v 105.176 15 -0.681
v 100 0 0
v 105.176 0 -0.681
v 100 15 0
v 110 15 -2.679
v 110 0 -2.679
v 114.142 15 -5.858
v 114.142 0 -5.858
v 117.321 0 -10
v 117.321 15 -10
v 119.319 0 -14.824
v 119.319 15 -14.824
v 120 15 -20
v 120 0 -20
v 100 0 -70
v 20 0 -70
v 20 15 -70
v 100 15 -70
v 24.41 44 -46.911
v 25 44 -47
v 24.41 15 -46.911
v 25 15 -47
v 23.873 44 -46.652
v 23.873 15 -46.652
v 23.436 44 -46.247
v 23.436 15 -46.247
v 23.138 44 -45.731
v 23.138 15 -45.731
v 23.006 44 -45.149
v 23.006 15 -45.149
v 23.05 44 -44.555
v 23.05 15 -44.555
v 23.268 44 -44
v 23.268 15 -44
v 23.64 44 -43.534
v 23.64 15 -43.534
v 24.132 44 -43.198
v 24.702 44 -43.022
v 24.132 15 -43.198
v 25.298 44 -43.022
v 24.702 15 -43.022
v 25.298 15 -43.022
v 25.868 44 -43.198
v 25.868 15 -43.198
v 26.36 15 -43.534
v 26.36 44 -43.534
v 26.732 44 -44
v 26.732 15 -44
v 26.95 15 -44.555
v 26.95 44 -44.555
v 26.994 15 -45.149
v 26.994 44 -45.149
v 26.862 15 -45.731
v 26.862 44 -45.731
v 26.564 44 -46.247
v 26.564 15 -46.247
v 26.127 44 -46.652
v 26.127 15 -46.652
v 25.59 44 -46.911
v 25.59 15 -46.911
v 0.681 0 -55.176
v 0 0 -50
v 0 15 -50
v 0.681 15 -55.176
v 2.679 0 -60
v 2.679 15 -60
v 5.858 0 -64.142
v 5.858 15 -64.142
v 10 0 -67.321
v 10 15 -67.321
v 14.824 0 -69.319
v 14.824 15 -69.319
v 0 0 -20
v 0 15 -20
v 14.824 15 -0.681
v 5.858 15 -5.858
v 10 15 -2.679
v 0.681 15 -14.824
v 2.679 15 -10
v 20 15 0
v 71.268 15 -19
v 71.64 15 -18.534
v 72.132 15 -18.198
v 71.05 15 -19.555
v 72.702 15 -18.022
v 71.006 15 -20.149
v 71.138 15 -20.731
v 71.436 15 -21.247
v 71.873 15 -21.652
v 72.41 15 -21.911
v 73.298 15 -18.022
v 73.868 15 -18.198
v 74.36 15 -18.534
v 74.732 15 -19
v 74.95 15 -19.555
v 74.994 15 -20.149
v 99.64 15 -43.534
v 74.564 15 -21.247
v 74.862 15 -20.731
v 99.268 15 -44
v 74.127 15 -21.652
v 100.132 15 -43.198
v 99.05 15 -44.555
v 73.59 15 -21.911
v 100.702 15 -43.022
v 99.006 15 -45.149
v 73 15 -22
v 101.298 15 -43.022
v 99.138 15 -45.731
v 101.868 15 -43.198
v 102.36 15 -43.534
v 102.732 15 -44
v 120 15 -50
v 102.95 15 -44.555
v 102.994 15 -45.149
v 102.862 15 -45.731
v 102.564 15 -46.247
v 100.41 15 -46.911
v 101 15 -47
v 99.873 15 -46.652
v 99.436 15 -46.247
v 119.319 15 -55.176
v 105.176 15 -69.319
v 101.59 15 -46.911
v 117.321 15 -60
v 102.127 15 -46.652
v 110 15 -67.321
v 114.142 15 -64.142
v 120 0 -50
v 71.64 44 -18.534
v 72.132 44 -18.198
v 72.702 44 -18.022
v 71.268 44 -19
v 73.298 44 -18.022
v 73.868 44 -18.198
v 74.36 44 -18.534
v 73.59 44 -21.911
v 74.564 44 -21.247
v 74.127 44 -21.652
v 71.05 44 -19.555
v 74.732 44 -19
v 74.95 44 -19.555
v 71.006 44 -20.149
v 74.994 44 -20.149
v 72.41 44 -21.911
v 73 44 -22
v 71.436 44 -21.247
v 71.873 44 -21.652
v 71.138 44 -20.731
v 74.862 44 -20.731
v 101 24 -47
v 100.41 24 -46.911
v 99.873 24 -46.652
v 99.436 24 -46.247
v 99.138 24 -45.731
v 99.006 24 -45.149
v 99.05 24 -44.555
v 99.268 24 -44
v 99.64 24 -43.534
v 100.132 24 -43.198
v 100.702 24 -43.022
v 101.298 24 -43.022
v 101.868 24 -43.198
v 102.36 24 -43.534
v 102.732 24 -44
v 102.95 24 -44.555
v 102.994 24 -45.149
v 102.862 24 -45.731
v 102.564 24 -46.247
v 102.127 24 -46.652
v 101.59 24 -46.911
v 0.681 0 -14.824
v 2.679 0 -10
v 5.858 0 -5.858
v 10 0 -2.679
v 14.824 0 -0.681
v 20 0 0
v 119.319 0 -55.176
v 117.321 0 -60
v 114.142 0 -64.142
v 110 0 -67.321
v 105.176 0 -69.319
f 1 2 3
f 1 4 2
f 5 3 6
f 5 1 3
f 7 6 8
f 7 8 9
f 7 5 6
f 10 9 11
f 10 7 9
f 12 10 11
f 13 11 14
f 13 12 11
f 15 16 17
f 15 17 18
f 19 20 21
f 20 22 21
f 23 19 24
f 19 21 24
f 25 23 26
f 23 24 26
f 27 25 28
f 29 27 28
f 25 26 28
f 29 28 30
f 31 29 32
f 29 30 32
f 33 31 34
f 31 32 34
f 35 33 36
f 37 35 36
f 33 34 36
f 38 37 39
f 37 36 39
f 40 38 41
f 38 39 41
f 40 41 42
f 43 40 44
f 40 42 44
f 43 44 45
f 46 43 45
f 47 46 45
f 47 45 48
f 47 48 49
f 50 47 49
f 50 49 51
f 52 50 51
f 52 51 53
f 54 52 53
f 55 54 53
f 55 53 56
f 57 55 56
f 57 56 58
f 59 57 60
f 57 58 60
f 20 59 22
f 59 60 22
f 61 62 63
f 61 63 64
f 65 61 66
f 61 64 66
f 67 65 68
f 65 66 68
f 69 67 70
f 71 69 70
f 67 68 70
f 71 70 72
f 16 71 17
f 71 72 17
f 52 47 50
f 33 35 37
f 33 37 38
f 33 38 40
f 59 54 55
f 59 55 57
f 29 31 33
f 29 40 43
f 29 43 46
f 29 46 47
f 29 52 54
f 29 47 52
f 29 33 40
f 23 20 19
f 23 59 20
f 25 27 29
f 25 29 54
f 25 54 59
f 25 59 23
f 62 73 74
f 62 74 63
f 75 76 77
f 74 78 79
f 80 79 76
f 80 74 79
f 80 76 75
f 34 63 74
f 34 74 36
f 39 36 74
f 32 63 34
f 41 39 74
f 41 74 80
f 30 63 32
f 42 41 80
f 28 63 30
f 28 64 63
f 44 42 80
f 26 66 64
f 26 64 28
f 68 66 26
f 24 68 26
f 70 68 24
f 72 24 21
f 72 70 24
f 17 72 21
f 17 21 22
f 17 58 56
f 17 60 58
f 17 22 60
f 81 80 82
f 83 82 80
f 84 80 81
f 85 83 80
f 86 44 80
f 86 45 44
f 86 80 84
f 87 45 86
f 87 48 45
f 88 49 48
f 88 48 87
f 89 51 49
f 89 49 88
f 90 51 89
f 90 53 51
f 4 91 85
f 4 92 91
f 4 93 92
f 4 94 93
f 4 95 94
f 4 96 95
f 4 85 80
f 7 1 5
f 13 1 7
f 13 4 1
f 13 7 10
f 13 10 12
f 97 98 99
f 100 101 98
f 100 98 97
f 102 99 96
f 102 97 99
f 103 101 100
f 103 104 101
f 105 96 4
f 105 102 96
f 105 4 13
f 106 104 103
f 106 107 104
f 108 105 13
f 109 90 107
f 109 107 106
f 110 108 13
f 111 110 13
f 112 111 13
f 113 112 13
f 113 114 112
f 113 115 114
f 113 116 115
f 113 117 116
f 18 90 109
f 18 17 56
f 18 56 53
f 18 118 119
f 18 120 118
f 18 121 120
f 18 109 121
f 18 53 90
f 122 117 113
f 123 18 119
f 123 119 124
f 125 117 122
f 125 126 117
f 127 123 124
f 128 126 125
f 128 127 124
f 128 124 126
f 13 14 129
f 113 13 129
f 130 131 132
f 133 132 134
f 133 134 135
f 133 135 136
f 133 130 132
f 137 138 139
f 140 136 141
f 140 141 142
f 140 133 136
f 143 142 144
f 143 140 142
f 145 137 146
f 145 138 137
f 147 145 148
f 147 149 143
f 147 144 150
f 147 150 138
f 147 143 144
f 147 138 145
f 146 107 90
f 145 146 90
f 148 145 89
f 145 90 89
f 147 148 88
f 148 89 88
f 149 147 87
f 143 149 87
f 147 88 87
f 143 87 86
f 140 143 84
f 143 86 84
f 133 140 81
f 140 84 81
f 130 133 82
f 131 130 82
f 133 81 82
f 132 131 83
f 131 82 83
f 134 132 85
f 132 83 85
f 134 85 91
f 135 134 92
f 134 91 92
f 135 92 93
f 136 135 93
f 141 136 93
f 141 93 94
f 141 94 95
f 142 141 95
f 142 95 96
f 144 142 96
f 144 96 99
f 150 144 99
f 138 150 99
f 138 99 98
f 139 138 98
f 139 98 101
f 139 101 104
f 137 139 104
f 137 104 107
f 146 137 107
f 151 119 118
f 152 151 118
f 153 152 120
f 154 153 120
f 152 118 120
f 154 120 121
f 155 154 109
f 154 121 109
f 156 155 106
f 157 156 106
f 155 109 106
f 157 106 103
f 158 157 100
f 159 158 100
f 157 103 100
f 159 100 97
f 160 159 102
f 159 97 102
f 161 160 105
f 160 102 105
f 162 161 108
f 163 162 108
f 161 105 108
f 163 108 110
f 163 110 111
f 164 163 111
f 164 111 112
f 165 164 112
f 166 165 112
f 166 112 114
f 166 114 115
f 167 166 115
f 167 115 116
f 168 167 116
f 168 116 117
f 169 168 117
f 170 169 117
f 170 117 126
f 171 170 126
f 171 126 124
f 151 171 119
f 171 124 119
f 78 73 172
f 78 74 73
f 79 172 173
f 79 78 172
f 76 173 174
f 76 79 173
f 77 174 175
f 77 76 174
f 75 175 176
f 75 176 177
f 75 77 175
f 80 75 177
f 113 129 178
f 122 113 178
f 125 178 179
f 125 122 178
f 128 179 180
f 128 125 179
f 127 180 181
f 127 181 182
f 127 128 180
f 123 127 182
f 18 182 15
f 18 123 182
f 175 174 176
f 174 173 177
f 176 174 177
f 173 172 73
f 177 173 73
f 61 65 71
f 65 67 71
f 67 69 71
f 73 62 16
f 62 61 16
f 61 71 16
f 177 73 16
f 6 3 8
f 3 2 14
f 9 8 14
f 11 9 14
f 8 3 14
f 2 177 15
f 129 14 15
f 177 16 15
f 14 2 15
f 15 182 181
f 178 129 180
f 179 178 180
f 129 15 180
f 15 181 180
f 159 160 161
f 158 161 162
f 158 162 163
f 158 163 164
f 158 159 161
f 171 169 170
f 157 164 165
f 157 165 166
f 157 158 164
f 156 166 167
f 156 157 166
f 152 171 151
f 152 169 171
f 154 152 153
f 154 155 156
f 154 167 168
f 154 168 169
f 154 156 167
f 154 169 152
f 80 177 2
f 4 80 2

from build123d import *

# Parameters (mm, degrees)
SKETCH1_W           = 120
SKETCH1_H           = 70
BOSS_EXTRUDE1_DEPTH = 15
FILLET1_R           = 20
SKETCH2_R           = 2
BOSS_EXTRUDE3_DEPTH = 9
SKETCH6_R           = 2
BOSS_EXTRUDE4_DEPTH = 20


with BuildPart() as part:
    # Sketch1 → Boss-Extrude1 (new body)
    with BuildSketch(Plane(origin=(0, 0, 0), x_dir=(1, 0, 0), z_dir=(0, 1, 0))):
        with Locations((60, 35)):
            Rectangle(SKETCH1_W, SKETCH1_H)
    extrude(amount=BOSS_EXTRUDE1_DEPTH)

    # Fillet1
    fillet1_edges = [part.edges().sort_by_distance(p)[0] for p in [
        (0, 7.5, -70),
        (120, 7.5, -70),
        (120, 7.5, 0),
        (0, 7.5, 0),
    ]]
    fillet(fillet1_edges, radius=FILLET1_R)

    # Sketch2 → Boss-Extrude3 (add)
    with BuildSketch(Plane(origin=(0, 15, 0), x_dir=(1, 0, 0), z_dir=(0, 1, 0))):
        with Locations(Location((25, 45, 0), (0, 0, 90))):
            Circle(SKETCH2_R)
        with Locations(Location((73, 20, 0), (0, 0, 90))):
            Circle(SKETCH2_R)
        with Locations(Location((101, 45, 0), (0, 0, 90))):
            Circle(SKETCH2_R)
    extrude(amount=BOSS_EXTRUDE3_DEPTH)

    # Sketch6 → Boss-Extrude4 (add)
    with BuildSketch(Plane(origin=(0, 24, 0), x_dir=(1, 0, 0), z_dir=(0, 1, 0))):
        with Locations(Location((25, 45, 0), (0, 0, 90))):
            Circle(SKETCH6_R)
        with Locations(Location((73, 20, 0), (0, 0, 90))):
            Circle(SKETCH6_R)
    extrude(amount=BOSS_EXTRUDE4_DEPTH)


solid = part.part
